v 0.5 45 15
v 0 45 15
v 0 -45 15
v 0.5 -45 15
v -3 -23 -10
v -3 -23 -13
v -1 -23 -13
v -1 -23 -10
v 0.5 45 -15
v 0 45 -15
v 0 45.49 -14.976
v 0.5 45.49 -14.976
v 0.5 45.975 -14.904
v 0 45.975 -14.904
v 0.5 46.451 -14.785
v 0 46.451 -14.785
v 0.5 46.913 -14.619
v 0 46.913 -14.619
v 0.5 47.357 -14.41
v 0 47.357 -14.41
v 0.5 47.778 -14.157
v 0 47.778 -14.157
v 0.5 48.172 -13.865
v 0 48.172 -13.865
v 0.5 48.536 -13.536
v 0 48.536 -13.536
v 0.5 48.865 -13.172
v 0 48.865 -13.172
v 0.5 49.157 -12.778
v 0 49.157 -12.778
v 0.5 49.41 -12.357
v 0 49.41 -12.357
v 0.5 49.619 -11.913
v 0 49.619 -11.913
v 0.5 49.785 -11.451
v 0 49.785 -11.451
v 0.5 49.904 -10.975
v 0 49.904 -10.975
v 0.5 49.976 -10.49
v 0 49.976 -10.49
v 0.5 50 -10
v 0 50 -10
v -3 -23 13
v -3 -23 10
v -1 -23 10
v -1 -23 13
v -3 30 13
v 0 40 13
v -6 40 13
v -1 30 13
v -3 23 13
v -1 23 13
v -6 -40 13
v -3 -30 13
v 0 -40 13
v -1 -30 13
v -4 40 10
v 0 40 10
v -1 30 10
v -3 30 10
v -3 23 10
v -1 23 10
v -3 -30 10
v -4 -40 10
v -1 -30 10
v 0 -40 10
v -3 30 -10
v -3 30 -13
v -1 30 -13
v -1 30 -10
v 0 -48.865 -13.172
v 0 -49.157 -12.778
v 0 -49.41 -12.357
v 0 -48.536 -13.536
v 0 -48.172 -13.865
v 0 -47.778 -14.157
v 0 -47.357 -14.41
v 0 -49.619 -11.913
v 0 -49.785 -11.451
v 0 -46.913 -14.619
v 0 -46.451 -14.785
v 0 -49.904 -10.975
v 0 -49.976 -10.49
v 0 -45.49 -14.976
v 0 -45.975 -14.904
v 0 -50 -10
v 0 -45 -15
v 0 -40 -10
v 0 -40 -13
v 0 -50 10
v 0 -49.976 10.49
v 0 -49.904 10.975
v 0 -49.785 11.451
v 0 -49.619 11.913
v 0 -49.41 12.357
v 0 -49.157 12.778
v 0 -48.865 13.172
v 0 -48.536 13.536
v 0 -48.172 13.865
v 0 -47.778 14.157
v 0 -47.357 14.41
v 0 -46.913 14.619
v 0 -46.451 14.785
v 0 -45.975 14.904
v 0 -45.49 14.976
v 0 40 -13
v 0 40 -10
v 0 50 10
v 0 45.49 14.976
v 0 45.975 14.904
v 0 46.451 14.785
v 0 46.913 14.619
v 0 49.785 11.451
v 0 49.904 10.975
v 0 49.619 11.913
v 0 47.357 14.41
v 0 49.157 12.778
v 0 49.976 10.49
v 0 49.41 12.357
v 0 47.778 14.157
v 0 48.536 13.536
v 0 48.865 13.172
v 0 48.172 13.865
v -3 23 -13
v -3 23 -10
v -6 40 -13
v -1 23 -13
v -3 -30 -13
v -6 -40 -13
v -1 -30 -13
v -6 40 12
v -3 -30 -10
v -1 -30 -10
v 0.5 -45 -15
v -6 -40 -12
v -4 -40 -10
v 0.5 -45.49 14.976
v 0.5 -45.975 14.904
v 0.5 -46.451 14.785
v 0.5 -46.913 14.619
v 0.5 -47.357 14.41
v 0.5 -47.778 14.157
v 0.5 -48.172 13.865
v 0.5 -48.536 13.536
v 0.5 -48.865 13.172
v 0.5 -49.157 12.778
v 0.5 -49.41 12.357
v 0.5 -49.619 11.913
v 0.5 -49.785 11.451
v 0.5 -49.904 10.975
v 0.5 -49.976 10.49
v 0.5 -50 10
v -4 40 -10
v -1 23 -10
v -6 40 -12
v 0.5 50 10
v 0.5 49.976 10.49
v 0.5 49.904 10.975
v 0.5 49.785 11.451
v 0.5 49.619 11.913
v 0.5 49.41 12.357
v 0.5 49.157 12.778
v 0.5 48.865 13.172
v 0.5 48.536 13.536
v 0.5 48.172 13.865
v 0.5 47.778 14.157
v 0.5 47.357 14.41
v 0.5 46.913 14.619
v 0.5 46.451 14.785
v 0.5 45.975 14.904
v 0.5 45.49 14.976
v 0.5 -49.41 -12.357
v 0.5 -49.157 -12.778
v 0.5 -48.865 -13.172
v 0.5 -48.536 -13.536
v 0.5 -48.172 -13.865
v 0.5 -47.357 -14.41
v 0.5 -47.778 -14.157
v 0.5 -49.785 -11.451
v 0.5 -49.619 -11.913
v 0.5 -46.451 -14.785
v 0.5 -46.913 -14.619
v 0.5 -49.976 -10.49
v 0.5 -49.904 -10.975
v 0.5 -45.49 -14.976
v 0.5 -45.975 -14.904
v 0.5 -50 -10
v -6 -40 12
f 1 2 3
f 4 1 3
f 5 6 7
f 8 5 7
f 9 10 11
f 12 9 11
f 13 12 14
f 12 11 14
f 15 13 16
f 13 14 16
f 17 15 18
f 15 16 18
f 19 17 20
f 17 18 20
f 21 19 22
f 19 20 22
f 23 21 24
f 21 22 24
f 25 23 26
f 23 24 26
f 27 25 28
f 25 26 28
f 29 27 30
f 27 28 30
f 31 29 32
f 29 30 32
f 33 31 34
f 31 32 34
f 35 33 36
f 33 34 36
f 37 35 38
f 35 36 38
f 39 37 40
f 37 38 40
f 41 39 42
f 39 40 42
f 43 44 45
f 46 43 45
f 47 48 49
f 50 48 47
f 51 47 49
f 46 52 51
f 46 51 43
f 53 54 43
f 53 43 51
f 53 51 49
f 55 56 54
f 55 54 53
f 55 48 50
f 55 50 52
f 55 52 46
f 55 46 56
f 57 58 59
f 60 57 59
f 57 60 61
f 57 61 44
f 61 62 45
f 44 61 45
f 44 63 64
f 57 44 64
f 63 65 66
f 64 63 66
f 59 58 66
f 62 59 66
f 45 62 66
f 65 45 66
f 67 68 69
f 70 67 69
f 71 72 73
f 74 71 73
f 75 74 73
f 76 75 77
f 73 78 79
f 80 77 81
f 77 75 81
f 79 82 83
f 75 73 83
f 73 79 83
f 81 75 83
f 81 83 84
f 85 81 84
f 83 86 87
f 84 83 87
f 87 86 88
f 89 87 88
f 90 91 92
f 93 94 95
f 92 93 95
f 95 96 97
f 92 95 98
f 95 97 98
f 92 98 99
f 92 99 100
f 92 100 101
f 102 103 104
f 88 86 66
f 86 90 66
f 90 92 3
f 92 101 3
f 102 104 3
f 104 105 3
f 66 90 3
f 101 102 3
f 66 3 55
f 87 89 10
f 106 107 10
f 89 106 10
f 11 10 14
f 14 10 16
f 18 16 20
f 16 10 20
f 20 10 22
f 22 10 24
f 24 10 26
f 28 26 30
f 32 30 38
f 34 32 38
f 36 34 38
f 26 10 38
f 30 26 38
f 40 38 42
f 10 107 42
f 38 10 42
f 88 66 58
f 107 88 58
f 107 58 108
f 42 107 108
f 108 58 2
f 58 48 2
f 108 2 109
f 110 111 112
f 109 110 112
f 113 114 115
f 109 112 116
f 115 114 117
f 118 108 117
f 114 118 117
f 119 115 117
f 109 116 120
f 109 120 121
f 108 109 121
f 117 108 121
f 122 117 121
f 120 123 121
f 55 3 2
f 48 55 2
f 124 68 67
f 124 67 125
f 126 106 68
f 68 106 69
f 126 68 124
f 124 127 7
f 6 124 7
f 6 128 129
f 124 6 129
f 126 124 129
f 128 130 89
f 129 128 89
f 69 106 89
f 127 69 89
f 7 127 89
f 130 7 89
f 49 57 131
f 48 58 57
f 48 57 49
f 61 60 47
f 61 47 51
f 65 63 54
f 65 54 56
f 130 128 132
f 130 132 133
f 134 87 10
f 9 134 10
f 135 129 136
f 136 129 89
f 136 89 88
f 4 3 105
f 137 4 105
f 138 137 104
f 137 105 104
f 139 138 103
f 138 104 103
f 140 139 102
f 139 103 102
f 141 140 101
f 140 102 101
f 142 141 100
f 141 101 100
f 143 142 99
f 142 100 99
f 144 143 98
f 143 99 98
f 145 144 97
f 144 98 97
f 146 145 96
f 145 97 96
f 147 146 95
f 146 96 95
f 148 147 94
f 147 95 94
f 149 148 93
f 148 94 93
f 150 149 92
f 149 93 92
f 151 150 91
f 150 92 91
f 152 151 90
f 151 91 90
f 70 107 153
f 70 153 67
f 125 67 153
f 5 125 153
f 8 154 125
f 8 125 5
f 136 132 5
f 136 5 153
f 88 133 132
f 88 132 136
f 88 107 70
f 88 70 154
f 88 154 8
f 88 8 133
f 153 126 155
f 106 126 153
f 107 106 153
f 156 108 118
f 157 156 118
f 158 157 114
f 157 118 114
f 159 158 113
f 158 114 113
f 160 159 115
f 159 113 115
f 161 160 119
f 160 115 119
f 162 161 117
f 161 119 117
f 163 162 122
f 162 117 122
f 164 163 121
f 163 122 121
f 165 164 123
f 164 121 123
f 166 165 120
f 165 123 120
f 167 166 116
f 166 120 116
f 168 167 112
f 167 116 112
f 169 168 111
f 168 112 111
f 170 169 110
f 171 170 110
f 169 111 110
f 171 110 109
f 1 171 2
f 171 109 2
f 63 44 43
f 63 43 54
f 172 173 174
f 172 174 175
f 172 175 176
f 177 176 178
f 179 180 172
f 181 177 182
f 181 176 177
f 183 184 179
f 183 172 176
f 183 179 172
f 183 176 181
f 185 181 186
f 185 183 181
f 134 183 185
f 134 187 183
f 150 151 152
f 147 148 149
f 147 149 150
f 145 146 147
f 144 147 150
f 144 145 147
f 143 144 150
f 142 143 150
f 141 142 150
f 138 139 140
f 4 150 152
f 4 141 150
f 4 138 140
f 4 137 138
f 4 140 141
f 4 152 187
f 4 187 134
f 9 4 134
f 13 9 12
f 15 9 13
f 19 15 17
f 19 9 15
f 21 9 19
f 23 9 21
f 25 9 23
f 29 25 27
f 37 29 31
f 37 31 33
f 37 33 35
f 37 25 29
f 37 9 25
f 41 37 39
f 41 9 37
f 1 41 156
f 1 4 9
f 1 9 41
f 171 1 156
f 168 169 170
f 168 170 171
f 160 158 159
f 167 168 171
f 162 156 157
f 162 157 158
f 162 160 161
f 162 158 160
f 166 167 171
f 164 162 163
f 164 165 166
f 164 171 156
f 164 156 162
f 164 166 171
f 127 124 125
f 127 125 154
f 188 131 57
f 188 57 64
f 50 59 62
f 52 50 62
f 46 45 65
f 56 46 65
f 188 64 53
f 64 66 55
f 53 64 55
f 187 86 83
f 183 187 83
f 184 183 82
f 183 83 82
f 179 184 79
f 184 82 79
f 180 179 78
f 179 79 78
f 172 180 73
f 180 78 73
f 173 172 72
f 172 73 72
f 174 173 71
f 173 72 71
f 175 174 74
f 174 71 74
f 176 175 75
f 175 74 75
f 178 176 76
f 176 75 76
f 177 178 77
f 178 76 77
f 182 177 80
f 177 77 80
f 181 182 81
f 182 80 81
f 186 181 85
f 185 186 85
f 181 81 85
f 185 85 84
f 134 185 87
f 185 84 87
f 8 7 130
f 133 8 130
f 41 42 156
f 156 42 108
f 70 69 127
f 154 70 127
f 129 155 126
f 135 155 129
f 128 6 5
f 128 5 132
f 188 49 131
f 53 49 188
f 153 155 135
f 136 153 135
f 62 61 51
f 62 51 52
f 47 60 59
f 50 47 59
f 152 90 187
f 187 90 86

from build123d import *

# Parameters (mm, degrees)
F1_DEPTH = 0.5
F2_W     = 80
F2_H     = 3
F3_DEPTH = 6
F4_W     = 2
F4_H     = 7
F5_DEPTH = 80
F6_SIZE  = 2


with BuildPart() as f1:
    # F0 (on Right) → F1 (new body)
    with BuildSketch(Plane.YZ):
        with BuildLine():
            ThreePointArc((-50, -10), (-48.535534, -13.535534), (-45, -15))
            Line((-45, -15), (45, -15))
            ThreePointArc((45, -15), (48.535534, -13.535534), (50, -10))
            Line((50, -10), (50, 10))
            ThreePointArc((50, 10), (48.535534, 13.535534), (45, 15))
            Line((45, 15), (-45, 15))
            ThreePointArc((-45, 15), (-48.535534, 13.535534), (-50, 10))
            Line((-50, 10), (-50, -10))
        make_face()
    extrude(amount=F1_DEPTH)

    # F2 (on face) → F3 (join)
    with BuildSketch(Plane(origin=(0, 0, 0), x_dir=(0, -1, 0), z_dir=(-1, 0, 0))):
        with Locations((0, 11.5)):
            Rectangle(F2_W, F2_H)
        with Locations((0, -11.5)):
            Rectangle(F2_W, F2_H)
    extrude(amount=F3_DEPTH)

    # F4 (on face) → F5 (cut)
    with BuildSketch(Plane(origin=(0, 0, -13), x_dir=(1, 0, 0), z_dir=(0, 0, -1))):
        with Locations((-2, -26.5)):
            Rectangle(F4_W, F4_H)
        with Locations((-2, 26.5)):
            Rectangle(F4_W, F4_H)
    extrude(amount=-F5_DEPTH, mode=Mode.SUBTRACT)

    # F6
    f6_edges = [f1.edges().sort_by_distance(p)[0] for p in [
        (-6, 0, -10),
        (-6, 0, 10),
    ]]
    chamfer(f6_edges, length=F6_SIZE)


solid = f1.part
